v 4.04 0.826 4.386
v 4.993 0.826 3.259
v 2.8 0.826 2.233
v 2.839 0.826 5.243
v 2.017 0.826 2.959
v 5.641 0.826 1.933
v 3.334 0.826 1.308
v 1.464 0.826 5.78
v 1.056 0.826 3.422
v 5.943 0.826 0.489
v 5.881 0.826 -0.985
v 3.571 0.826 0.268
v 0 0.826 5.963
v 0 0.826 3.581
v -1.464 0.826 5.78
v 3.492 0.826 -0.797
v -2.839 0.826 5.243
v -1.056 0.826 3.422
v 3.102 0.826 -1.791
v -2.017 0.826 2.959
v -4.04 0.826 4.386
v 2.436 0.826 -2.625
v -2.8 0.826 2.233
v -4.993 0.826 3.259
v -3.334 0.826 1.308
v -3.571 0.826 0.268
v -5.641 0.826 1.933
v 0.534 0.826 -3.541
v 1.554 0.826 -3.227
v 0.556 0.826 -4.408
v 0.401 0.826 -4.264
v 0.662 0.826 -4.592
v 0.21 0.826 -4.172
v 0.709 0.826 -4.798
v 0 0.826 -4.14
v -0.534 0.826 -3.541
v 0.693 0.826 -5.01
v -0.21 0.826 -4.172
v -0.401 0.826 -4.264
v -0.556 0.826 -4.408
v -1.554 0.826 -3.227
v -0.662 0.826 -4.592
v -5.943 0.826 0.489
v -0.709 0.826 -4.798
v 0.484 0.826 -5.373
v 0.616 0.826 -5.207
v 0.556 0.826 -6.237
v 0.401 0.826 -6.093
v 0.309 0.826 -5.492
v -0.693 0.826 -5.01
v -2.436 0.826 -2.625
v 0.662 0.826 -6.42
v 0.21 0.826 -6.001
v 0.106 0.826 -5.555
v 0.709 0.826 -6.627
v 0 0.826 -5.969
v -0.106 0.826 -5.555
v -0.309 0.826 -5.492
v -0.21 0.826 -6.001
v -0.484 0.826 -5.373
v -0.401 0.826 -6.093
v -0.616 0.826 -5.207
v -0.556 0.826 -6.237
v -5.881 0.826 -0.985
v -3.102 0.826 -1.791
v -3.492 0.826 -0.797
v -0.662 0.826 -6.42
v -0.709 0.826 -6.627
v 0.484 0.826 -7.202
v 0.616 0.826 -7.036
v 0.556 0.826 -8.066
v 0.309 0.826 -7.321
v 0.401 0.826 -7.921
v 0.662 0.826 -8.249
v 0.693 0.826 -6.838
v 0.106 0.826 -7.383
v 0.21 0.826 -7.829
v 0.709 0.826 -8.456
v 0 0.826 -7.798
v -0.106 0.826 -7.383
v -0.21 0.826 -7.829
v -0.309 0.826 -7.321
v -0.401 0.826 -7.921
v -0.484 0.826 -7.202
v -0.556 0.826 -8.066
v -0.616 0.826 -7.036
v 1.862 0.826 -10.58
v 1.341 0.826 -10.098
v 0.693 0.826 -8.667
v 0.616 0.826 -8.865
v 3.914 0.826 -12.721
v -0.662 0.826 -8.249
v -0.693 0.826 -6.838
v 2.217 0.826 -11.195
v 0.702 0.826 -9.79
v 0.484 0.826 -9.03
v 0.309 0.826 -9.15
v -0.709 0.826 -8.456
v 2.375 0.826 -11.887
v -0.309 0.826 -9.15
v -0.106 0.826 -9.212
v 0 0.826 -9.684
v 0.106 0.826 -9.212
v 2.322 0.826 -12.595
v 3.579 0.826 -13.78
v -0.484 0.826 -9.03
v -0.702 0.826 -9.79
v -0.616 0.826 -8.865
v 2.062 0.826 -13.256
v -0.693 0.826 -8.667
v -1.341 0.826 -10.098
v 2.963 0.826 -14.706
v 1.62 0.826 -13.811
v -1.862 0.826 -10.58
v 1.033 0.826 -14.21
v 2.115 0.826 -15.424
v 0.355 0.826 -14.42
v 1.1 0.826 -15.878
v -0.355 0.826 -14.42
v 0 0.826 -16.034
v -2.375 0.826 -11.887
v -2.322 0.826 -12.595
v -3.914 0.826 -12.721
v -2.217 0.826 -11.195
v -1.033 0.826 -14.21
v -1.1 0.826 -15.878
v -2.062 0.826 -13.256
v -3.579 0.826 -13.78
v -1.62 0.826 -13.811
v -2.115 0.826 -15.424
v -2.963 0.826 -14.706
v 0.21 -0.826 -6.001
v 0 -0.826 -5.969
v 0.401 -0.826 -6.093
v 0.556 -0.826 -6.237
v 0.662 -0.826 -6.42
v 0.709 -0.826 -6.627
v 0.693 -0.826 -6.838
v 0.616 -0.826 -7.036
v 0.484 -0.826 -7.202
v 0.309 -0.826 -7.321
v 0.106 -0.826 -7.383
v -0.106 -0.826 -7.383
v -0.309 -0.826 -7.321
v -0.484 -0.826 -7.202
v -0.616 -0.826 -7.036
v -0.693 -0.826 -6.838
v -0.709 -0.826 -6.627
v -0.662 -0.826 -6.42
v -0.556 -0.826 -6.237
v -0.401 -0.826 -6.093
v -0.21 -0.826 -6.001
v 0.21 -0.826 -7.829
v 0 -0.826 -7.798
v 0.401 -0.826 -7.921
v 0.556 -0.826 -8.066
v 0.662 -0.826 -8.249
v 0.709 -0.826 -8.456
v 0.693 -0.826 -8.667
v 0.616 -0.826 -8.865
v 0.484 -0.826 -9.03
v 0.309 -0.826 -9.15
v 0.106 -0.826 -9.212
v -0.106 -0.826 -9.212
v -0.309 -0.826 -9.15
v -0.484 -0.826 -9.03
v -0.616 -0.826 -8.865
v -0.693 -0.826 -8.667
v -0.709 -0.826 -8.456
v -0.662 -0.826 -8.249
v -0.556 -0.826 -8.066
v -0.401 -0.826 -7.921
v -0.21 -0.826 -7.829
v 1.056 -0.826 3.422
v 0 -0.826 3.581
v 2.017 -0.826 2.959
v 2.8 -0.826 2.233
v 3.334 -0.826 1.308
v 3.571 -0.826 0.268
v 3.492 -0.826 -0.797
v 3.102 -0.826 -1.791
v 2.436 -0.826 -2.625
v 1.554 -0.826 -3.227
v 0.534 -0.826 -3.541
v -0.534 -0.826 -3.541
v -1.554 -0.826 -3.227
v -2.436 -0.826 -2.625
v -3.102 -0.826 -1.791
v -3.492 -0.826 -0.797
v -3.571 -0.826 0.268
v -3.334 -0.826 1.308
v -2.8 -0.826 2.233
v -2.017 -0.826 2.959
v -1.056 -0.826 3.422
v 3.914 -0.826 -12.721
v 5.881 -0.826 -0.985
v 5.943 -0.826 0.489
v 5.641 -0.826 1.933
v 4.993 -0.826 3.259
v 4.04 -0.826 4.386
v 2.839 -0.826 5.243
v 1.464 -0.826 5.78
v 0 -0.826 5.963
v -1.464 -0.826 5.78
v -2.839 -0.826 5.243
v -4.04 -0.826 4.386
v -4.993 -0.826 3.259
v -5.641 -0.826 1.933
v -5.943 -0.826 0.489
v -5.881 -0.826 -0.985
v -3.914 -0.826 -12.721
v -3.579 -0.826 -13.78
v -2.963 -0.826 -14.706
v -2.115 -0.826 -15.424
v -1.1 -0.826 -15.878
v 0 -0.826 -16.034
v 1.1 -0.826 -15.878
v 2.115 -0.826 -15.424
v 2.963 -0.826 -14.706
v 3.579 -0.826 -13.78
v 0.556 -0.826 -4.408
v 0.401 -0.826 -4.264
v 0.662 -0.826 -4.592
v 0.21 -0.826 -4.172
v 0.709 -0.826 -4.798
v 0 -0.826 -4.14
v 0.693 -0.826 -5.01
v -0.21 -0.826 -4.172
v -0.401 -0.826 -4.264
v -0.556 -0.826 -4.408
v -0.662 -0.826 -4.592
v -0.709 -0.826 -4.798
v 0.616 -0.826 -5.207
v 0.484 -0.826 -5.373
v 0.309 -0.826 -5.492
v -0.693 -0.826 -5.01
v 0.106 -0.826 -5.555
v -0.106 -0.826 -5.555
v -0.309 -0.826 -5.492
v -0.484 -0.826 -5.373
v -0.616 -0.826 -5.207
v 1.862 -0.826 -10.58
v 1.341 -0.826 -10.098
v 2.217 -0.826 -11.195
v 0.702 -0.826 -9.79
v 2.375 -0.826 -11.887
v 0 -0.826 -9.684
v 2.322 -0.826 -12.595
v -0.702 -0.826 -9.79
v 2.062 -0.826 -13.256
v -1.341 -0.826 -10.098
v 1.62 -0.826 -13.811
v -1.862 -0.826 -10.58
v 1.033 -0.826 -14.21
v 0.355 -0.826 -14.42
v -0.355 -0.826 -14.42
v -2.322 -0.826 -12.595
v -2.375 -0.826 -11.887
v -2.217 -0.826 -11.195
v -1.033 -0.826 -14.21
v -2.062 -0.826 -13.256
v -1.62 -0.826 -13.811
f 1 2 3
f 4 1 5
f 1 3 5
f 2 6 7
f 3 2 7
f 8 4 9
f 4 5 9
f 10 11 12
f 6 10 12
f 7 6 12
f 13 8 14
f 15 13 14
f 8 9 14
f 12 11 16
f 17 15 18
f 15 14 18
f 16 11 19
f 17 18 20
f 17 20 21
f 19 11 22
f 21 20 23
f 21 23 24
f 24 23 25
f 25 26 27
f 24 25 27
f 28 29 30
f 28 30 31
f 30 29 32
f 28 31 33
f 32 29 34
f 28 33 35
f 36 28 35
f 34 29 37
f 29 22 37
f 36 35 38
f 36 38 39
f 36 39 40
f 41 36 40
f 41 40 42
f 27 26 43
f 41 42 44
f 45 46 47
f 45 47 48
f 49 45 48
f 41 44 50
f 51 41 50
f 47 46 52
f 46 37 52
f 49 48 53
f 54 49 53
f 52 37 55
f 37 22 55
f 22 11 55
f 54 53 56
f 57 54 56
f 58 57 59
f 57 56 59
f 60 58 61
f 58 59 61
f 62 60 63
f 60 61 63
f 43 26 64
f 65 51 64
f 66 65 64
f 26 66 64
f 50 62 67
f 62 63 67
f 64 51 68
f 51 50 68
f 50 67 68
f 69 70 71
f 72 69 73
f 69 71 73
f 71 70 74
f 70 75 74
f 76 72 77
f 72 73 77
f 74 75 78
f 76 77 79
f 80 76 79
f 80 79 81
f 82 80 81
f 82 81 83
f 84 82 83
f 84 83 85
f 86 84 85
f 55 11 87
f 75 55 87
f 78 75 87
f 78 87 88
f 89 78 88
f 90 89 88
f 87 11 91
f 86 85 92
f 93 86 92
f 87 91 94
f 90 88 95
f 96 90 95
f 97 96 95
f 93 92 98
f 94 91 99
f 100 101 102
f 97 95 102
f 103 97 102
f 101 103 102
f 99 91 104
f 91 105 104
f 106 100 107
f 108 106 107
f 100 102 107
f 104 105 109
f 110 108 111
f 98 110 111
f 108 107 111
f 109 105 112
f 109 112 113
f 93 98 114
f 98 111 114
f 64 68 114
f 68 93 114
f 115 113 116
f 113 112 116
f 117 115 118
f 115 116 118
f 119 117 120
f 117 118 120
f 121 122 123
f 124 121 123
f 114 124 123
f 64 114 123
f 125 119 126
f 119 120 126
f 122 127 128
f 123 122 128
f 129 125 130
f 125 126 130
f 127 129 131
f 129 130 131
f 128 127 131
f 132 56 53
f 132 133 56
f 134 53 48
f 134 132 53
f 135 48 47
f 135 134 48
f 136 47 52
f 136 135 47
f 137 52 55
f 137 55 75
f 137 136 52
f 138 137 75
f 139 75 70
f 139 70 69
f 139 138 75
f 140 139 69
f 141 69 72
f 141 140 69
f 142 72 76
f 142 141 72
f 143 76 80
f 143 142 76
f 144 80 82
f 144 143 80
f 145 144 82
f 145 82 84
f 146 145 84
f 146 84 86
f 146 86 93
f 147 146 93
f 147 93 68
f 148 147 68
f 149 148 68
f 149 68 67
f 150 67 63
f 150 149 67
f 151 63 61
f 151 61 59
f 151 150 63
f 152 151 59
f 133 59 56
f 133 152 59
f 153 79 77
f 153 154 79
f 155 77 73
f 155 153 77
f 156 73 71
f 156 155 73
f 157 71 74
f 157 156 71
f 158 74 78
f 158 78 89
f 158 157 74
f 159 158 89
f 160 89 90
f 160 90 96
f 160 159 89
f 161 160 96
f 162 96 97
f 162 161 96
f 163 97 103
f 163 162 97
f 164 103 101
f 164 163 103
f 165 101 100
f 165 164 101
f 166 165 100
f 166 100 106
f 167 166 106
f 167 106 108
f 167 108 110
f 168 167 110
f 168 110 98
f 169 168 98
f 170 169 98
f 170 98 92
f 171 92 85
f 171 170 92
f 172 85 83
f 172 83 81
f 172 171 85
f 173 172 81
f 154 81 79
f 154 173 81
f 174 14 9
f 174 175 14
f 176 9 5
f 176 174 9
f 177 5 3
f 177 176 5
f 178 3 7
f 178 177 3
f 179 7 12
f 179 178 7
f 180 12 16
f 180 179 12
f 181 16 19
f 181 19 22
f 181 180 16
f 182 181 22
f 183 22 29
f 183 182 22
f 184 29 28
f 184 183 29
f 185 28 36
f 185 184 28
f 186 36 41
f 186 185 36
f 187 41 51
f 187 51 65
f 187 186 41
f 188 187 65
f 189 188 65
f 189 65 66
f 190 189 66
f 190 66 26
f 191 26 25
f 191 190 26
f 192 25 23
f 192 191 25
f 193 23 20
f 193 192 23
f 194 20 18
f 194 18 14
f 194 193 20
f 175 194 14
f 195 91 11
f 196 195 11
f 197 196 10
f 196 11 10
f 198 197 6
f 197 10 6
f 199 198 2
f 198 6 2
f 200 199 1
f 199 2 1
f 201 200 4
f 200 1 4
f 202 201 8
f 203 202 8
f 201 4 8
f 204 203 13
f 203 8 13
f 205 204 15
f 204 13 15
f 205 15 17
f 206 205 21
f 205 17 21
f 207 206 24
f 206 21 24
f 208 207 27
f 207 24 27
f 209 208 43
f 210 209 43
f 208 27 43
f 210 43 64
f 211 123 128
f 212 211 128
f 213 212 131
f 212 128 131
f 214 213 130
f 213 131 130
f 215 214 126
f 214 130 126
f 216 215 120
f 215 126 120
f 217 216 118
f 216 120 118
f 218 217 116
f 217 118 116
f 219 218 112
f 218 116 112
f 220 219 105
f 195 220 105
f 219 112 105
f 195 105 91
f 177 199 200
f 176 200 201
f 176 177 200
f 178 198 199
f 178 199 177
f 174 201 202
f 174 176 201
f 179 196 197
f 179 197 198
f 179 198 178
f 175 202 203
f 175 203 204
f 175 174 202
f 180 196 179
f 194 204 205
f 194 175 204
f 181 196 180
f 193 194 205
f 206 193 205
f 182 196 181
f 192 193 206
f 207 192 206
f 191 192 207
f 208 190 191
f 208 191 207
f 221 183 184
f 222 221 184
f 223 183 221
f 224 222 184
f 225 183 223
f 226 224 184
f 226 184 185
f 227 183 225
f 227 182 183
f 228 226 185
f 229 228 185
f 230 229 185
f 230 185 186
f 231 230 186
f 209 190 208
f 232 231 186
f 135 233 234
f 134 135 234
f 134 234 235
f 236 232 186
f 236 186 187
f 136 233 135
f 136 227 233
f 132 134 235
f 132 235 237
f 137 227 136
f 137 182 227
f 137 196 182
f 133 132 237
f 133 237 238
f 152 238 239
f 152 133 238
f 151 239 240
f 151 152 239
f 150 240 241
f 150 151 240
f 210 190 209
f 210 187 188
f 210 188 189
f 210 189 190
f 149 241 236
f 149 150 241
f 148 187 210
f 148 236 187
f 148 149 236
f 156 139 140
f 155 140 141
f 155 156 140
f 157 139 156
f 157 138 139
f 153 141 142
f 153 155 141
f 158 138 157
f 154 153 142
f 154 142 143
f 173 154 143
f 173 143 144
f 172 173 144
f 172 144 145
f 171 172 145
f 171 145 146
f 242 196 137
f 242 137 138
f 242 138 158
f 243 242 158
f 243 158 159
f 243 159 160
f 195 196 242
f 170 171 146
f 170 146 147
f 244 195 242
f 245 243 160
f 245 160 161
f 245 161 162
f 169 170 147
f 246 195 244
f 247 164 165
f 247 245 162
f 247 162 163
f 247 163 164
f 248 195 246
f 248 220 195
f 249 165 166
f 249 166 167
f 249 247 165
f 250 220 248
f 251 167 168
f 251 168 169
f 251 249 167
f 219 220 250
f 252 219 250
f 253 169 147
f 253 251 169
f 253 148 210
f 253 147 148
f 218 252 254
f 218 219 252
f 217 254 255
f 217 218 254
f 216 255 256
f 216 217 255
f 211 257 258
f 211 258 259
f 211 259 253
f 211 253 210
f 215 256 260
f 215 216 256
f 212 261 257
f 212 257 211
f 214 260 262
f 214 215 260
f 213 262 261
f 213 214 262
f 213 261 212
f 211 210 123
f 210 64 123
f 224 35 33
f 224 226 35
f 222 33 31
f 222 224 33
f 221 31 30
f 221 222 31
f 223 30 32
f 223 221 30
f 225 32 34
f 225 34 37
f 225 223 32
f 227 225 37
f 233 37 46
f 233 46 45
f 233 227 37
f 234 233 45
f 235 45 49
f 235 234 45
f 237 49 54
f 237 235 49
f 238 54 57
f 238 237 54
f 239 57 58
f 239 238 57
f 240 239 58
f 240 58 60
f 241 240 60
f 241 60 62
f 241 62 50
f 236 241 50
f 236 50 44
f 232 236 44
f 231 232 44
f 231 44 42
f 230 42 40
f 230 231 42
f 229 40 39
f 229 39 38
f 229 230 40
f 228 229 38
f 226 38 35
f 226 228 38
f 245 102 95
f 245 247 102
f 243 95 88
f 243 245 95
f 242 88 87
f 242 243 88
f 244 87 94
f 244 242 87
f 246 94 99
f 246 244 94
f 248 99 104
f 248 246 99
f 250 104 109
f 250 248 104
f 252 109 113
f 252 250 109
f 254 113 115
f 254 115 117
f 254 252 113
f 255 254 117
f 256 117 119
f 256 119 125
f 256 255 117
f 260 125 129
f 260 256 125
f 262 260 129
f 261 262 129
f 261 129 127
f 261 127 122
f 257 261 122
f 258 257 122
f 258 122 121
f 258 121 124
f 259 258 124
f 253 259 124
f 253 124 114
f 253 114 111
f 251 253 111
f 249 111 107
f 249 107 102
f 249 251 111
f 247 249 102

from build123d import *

# Parameters (mm, degrees)
SKETCH1_R      = 3.5814
SKETCH1_R_2    = 0.7112
SKETCH1_R_3    = 2.38125
EXTRUDE1_DEPTH = 0.8255


with BuildPart() as part:
    # Sketch1 → Extrude1 (new body, symmetric)
    with BuildSketch(Plane(origin=(0, 0, 0), x_dir=(1, 0, 0), z_dir=(0, 1, 0))):
        with BuildLine():
            Line((3.914177728, 12.720888158), (5.880660619, 0.985406368))
            ThreePointArc((5.880660619, 0.985406368), (0, -5.96265), (-5.880660619, 0.985406368))
            Line((-5.880660619, 0.985406368), (-3.914177728, 12.720888158))
            ThreePointArc((-3.914177728, 12.720888158), (0, 16.03375), (3.914177728, 12.720888158))
        make_face()
        with Locations(Location((0, 0, 0), (0, 0, 270))):  # turned: the seam where the file's is
            Circle(SKETCH1_R, mode=Mode.SUBTRACT)
        with Locations(Location((0, 4.8514, 0), (0, 0, 270))):  # turned: the seam where the file's is
            Circle(SKETCH1_R_2, mode=Mode.SUBTRACT)
        with Locations(Location((0, 6.6802, 0), (0, 0, 270))):  # turned: the seam where the file's is
            Circle(SKETCH1_R_2, mode=Mode.SUBTRACT)
        with Locations(Location((0, 8.509, 0), (0, 0, 270))):  # turned: the seam where the file's is
            Circle(SKETCH1_R_2, mode=Mode.SUBTRACT)
        with Locations(Location((0, 12.065, 0), (0, 0, 270))):  # turned: the seam where the file's is
            Circle(SKETCH1_R_3, mode=Mode.SUBTRACT)
    extrude(amount=EXTRUDE1_DEPTH, both=True)


solid = part.part
